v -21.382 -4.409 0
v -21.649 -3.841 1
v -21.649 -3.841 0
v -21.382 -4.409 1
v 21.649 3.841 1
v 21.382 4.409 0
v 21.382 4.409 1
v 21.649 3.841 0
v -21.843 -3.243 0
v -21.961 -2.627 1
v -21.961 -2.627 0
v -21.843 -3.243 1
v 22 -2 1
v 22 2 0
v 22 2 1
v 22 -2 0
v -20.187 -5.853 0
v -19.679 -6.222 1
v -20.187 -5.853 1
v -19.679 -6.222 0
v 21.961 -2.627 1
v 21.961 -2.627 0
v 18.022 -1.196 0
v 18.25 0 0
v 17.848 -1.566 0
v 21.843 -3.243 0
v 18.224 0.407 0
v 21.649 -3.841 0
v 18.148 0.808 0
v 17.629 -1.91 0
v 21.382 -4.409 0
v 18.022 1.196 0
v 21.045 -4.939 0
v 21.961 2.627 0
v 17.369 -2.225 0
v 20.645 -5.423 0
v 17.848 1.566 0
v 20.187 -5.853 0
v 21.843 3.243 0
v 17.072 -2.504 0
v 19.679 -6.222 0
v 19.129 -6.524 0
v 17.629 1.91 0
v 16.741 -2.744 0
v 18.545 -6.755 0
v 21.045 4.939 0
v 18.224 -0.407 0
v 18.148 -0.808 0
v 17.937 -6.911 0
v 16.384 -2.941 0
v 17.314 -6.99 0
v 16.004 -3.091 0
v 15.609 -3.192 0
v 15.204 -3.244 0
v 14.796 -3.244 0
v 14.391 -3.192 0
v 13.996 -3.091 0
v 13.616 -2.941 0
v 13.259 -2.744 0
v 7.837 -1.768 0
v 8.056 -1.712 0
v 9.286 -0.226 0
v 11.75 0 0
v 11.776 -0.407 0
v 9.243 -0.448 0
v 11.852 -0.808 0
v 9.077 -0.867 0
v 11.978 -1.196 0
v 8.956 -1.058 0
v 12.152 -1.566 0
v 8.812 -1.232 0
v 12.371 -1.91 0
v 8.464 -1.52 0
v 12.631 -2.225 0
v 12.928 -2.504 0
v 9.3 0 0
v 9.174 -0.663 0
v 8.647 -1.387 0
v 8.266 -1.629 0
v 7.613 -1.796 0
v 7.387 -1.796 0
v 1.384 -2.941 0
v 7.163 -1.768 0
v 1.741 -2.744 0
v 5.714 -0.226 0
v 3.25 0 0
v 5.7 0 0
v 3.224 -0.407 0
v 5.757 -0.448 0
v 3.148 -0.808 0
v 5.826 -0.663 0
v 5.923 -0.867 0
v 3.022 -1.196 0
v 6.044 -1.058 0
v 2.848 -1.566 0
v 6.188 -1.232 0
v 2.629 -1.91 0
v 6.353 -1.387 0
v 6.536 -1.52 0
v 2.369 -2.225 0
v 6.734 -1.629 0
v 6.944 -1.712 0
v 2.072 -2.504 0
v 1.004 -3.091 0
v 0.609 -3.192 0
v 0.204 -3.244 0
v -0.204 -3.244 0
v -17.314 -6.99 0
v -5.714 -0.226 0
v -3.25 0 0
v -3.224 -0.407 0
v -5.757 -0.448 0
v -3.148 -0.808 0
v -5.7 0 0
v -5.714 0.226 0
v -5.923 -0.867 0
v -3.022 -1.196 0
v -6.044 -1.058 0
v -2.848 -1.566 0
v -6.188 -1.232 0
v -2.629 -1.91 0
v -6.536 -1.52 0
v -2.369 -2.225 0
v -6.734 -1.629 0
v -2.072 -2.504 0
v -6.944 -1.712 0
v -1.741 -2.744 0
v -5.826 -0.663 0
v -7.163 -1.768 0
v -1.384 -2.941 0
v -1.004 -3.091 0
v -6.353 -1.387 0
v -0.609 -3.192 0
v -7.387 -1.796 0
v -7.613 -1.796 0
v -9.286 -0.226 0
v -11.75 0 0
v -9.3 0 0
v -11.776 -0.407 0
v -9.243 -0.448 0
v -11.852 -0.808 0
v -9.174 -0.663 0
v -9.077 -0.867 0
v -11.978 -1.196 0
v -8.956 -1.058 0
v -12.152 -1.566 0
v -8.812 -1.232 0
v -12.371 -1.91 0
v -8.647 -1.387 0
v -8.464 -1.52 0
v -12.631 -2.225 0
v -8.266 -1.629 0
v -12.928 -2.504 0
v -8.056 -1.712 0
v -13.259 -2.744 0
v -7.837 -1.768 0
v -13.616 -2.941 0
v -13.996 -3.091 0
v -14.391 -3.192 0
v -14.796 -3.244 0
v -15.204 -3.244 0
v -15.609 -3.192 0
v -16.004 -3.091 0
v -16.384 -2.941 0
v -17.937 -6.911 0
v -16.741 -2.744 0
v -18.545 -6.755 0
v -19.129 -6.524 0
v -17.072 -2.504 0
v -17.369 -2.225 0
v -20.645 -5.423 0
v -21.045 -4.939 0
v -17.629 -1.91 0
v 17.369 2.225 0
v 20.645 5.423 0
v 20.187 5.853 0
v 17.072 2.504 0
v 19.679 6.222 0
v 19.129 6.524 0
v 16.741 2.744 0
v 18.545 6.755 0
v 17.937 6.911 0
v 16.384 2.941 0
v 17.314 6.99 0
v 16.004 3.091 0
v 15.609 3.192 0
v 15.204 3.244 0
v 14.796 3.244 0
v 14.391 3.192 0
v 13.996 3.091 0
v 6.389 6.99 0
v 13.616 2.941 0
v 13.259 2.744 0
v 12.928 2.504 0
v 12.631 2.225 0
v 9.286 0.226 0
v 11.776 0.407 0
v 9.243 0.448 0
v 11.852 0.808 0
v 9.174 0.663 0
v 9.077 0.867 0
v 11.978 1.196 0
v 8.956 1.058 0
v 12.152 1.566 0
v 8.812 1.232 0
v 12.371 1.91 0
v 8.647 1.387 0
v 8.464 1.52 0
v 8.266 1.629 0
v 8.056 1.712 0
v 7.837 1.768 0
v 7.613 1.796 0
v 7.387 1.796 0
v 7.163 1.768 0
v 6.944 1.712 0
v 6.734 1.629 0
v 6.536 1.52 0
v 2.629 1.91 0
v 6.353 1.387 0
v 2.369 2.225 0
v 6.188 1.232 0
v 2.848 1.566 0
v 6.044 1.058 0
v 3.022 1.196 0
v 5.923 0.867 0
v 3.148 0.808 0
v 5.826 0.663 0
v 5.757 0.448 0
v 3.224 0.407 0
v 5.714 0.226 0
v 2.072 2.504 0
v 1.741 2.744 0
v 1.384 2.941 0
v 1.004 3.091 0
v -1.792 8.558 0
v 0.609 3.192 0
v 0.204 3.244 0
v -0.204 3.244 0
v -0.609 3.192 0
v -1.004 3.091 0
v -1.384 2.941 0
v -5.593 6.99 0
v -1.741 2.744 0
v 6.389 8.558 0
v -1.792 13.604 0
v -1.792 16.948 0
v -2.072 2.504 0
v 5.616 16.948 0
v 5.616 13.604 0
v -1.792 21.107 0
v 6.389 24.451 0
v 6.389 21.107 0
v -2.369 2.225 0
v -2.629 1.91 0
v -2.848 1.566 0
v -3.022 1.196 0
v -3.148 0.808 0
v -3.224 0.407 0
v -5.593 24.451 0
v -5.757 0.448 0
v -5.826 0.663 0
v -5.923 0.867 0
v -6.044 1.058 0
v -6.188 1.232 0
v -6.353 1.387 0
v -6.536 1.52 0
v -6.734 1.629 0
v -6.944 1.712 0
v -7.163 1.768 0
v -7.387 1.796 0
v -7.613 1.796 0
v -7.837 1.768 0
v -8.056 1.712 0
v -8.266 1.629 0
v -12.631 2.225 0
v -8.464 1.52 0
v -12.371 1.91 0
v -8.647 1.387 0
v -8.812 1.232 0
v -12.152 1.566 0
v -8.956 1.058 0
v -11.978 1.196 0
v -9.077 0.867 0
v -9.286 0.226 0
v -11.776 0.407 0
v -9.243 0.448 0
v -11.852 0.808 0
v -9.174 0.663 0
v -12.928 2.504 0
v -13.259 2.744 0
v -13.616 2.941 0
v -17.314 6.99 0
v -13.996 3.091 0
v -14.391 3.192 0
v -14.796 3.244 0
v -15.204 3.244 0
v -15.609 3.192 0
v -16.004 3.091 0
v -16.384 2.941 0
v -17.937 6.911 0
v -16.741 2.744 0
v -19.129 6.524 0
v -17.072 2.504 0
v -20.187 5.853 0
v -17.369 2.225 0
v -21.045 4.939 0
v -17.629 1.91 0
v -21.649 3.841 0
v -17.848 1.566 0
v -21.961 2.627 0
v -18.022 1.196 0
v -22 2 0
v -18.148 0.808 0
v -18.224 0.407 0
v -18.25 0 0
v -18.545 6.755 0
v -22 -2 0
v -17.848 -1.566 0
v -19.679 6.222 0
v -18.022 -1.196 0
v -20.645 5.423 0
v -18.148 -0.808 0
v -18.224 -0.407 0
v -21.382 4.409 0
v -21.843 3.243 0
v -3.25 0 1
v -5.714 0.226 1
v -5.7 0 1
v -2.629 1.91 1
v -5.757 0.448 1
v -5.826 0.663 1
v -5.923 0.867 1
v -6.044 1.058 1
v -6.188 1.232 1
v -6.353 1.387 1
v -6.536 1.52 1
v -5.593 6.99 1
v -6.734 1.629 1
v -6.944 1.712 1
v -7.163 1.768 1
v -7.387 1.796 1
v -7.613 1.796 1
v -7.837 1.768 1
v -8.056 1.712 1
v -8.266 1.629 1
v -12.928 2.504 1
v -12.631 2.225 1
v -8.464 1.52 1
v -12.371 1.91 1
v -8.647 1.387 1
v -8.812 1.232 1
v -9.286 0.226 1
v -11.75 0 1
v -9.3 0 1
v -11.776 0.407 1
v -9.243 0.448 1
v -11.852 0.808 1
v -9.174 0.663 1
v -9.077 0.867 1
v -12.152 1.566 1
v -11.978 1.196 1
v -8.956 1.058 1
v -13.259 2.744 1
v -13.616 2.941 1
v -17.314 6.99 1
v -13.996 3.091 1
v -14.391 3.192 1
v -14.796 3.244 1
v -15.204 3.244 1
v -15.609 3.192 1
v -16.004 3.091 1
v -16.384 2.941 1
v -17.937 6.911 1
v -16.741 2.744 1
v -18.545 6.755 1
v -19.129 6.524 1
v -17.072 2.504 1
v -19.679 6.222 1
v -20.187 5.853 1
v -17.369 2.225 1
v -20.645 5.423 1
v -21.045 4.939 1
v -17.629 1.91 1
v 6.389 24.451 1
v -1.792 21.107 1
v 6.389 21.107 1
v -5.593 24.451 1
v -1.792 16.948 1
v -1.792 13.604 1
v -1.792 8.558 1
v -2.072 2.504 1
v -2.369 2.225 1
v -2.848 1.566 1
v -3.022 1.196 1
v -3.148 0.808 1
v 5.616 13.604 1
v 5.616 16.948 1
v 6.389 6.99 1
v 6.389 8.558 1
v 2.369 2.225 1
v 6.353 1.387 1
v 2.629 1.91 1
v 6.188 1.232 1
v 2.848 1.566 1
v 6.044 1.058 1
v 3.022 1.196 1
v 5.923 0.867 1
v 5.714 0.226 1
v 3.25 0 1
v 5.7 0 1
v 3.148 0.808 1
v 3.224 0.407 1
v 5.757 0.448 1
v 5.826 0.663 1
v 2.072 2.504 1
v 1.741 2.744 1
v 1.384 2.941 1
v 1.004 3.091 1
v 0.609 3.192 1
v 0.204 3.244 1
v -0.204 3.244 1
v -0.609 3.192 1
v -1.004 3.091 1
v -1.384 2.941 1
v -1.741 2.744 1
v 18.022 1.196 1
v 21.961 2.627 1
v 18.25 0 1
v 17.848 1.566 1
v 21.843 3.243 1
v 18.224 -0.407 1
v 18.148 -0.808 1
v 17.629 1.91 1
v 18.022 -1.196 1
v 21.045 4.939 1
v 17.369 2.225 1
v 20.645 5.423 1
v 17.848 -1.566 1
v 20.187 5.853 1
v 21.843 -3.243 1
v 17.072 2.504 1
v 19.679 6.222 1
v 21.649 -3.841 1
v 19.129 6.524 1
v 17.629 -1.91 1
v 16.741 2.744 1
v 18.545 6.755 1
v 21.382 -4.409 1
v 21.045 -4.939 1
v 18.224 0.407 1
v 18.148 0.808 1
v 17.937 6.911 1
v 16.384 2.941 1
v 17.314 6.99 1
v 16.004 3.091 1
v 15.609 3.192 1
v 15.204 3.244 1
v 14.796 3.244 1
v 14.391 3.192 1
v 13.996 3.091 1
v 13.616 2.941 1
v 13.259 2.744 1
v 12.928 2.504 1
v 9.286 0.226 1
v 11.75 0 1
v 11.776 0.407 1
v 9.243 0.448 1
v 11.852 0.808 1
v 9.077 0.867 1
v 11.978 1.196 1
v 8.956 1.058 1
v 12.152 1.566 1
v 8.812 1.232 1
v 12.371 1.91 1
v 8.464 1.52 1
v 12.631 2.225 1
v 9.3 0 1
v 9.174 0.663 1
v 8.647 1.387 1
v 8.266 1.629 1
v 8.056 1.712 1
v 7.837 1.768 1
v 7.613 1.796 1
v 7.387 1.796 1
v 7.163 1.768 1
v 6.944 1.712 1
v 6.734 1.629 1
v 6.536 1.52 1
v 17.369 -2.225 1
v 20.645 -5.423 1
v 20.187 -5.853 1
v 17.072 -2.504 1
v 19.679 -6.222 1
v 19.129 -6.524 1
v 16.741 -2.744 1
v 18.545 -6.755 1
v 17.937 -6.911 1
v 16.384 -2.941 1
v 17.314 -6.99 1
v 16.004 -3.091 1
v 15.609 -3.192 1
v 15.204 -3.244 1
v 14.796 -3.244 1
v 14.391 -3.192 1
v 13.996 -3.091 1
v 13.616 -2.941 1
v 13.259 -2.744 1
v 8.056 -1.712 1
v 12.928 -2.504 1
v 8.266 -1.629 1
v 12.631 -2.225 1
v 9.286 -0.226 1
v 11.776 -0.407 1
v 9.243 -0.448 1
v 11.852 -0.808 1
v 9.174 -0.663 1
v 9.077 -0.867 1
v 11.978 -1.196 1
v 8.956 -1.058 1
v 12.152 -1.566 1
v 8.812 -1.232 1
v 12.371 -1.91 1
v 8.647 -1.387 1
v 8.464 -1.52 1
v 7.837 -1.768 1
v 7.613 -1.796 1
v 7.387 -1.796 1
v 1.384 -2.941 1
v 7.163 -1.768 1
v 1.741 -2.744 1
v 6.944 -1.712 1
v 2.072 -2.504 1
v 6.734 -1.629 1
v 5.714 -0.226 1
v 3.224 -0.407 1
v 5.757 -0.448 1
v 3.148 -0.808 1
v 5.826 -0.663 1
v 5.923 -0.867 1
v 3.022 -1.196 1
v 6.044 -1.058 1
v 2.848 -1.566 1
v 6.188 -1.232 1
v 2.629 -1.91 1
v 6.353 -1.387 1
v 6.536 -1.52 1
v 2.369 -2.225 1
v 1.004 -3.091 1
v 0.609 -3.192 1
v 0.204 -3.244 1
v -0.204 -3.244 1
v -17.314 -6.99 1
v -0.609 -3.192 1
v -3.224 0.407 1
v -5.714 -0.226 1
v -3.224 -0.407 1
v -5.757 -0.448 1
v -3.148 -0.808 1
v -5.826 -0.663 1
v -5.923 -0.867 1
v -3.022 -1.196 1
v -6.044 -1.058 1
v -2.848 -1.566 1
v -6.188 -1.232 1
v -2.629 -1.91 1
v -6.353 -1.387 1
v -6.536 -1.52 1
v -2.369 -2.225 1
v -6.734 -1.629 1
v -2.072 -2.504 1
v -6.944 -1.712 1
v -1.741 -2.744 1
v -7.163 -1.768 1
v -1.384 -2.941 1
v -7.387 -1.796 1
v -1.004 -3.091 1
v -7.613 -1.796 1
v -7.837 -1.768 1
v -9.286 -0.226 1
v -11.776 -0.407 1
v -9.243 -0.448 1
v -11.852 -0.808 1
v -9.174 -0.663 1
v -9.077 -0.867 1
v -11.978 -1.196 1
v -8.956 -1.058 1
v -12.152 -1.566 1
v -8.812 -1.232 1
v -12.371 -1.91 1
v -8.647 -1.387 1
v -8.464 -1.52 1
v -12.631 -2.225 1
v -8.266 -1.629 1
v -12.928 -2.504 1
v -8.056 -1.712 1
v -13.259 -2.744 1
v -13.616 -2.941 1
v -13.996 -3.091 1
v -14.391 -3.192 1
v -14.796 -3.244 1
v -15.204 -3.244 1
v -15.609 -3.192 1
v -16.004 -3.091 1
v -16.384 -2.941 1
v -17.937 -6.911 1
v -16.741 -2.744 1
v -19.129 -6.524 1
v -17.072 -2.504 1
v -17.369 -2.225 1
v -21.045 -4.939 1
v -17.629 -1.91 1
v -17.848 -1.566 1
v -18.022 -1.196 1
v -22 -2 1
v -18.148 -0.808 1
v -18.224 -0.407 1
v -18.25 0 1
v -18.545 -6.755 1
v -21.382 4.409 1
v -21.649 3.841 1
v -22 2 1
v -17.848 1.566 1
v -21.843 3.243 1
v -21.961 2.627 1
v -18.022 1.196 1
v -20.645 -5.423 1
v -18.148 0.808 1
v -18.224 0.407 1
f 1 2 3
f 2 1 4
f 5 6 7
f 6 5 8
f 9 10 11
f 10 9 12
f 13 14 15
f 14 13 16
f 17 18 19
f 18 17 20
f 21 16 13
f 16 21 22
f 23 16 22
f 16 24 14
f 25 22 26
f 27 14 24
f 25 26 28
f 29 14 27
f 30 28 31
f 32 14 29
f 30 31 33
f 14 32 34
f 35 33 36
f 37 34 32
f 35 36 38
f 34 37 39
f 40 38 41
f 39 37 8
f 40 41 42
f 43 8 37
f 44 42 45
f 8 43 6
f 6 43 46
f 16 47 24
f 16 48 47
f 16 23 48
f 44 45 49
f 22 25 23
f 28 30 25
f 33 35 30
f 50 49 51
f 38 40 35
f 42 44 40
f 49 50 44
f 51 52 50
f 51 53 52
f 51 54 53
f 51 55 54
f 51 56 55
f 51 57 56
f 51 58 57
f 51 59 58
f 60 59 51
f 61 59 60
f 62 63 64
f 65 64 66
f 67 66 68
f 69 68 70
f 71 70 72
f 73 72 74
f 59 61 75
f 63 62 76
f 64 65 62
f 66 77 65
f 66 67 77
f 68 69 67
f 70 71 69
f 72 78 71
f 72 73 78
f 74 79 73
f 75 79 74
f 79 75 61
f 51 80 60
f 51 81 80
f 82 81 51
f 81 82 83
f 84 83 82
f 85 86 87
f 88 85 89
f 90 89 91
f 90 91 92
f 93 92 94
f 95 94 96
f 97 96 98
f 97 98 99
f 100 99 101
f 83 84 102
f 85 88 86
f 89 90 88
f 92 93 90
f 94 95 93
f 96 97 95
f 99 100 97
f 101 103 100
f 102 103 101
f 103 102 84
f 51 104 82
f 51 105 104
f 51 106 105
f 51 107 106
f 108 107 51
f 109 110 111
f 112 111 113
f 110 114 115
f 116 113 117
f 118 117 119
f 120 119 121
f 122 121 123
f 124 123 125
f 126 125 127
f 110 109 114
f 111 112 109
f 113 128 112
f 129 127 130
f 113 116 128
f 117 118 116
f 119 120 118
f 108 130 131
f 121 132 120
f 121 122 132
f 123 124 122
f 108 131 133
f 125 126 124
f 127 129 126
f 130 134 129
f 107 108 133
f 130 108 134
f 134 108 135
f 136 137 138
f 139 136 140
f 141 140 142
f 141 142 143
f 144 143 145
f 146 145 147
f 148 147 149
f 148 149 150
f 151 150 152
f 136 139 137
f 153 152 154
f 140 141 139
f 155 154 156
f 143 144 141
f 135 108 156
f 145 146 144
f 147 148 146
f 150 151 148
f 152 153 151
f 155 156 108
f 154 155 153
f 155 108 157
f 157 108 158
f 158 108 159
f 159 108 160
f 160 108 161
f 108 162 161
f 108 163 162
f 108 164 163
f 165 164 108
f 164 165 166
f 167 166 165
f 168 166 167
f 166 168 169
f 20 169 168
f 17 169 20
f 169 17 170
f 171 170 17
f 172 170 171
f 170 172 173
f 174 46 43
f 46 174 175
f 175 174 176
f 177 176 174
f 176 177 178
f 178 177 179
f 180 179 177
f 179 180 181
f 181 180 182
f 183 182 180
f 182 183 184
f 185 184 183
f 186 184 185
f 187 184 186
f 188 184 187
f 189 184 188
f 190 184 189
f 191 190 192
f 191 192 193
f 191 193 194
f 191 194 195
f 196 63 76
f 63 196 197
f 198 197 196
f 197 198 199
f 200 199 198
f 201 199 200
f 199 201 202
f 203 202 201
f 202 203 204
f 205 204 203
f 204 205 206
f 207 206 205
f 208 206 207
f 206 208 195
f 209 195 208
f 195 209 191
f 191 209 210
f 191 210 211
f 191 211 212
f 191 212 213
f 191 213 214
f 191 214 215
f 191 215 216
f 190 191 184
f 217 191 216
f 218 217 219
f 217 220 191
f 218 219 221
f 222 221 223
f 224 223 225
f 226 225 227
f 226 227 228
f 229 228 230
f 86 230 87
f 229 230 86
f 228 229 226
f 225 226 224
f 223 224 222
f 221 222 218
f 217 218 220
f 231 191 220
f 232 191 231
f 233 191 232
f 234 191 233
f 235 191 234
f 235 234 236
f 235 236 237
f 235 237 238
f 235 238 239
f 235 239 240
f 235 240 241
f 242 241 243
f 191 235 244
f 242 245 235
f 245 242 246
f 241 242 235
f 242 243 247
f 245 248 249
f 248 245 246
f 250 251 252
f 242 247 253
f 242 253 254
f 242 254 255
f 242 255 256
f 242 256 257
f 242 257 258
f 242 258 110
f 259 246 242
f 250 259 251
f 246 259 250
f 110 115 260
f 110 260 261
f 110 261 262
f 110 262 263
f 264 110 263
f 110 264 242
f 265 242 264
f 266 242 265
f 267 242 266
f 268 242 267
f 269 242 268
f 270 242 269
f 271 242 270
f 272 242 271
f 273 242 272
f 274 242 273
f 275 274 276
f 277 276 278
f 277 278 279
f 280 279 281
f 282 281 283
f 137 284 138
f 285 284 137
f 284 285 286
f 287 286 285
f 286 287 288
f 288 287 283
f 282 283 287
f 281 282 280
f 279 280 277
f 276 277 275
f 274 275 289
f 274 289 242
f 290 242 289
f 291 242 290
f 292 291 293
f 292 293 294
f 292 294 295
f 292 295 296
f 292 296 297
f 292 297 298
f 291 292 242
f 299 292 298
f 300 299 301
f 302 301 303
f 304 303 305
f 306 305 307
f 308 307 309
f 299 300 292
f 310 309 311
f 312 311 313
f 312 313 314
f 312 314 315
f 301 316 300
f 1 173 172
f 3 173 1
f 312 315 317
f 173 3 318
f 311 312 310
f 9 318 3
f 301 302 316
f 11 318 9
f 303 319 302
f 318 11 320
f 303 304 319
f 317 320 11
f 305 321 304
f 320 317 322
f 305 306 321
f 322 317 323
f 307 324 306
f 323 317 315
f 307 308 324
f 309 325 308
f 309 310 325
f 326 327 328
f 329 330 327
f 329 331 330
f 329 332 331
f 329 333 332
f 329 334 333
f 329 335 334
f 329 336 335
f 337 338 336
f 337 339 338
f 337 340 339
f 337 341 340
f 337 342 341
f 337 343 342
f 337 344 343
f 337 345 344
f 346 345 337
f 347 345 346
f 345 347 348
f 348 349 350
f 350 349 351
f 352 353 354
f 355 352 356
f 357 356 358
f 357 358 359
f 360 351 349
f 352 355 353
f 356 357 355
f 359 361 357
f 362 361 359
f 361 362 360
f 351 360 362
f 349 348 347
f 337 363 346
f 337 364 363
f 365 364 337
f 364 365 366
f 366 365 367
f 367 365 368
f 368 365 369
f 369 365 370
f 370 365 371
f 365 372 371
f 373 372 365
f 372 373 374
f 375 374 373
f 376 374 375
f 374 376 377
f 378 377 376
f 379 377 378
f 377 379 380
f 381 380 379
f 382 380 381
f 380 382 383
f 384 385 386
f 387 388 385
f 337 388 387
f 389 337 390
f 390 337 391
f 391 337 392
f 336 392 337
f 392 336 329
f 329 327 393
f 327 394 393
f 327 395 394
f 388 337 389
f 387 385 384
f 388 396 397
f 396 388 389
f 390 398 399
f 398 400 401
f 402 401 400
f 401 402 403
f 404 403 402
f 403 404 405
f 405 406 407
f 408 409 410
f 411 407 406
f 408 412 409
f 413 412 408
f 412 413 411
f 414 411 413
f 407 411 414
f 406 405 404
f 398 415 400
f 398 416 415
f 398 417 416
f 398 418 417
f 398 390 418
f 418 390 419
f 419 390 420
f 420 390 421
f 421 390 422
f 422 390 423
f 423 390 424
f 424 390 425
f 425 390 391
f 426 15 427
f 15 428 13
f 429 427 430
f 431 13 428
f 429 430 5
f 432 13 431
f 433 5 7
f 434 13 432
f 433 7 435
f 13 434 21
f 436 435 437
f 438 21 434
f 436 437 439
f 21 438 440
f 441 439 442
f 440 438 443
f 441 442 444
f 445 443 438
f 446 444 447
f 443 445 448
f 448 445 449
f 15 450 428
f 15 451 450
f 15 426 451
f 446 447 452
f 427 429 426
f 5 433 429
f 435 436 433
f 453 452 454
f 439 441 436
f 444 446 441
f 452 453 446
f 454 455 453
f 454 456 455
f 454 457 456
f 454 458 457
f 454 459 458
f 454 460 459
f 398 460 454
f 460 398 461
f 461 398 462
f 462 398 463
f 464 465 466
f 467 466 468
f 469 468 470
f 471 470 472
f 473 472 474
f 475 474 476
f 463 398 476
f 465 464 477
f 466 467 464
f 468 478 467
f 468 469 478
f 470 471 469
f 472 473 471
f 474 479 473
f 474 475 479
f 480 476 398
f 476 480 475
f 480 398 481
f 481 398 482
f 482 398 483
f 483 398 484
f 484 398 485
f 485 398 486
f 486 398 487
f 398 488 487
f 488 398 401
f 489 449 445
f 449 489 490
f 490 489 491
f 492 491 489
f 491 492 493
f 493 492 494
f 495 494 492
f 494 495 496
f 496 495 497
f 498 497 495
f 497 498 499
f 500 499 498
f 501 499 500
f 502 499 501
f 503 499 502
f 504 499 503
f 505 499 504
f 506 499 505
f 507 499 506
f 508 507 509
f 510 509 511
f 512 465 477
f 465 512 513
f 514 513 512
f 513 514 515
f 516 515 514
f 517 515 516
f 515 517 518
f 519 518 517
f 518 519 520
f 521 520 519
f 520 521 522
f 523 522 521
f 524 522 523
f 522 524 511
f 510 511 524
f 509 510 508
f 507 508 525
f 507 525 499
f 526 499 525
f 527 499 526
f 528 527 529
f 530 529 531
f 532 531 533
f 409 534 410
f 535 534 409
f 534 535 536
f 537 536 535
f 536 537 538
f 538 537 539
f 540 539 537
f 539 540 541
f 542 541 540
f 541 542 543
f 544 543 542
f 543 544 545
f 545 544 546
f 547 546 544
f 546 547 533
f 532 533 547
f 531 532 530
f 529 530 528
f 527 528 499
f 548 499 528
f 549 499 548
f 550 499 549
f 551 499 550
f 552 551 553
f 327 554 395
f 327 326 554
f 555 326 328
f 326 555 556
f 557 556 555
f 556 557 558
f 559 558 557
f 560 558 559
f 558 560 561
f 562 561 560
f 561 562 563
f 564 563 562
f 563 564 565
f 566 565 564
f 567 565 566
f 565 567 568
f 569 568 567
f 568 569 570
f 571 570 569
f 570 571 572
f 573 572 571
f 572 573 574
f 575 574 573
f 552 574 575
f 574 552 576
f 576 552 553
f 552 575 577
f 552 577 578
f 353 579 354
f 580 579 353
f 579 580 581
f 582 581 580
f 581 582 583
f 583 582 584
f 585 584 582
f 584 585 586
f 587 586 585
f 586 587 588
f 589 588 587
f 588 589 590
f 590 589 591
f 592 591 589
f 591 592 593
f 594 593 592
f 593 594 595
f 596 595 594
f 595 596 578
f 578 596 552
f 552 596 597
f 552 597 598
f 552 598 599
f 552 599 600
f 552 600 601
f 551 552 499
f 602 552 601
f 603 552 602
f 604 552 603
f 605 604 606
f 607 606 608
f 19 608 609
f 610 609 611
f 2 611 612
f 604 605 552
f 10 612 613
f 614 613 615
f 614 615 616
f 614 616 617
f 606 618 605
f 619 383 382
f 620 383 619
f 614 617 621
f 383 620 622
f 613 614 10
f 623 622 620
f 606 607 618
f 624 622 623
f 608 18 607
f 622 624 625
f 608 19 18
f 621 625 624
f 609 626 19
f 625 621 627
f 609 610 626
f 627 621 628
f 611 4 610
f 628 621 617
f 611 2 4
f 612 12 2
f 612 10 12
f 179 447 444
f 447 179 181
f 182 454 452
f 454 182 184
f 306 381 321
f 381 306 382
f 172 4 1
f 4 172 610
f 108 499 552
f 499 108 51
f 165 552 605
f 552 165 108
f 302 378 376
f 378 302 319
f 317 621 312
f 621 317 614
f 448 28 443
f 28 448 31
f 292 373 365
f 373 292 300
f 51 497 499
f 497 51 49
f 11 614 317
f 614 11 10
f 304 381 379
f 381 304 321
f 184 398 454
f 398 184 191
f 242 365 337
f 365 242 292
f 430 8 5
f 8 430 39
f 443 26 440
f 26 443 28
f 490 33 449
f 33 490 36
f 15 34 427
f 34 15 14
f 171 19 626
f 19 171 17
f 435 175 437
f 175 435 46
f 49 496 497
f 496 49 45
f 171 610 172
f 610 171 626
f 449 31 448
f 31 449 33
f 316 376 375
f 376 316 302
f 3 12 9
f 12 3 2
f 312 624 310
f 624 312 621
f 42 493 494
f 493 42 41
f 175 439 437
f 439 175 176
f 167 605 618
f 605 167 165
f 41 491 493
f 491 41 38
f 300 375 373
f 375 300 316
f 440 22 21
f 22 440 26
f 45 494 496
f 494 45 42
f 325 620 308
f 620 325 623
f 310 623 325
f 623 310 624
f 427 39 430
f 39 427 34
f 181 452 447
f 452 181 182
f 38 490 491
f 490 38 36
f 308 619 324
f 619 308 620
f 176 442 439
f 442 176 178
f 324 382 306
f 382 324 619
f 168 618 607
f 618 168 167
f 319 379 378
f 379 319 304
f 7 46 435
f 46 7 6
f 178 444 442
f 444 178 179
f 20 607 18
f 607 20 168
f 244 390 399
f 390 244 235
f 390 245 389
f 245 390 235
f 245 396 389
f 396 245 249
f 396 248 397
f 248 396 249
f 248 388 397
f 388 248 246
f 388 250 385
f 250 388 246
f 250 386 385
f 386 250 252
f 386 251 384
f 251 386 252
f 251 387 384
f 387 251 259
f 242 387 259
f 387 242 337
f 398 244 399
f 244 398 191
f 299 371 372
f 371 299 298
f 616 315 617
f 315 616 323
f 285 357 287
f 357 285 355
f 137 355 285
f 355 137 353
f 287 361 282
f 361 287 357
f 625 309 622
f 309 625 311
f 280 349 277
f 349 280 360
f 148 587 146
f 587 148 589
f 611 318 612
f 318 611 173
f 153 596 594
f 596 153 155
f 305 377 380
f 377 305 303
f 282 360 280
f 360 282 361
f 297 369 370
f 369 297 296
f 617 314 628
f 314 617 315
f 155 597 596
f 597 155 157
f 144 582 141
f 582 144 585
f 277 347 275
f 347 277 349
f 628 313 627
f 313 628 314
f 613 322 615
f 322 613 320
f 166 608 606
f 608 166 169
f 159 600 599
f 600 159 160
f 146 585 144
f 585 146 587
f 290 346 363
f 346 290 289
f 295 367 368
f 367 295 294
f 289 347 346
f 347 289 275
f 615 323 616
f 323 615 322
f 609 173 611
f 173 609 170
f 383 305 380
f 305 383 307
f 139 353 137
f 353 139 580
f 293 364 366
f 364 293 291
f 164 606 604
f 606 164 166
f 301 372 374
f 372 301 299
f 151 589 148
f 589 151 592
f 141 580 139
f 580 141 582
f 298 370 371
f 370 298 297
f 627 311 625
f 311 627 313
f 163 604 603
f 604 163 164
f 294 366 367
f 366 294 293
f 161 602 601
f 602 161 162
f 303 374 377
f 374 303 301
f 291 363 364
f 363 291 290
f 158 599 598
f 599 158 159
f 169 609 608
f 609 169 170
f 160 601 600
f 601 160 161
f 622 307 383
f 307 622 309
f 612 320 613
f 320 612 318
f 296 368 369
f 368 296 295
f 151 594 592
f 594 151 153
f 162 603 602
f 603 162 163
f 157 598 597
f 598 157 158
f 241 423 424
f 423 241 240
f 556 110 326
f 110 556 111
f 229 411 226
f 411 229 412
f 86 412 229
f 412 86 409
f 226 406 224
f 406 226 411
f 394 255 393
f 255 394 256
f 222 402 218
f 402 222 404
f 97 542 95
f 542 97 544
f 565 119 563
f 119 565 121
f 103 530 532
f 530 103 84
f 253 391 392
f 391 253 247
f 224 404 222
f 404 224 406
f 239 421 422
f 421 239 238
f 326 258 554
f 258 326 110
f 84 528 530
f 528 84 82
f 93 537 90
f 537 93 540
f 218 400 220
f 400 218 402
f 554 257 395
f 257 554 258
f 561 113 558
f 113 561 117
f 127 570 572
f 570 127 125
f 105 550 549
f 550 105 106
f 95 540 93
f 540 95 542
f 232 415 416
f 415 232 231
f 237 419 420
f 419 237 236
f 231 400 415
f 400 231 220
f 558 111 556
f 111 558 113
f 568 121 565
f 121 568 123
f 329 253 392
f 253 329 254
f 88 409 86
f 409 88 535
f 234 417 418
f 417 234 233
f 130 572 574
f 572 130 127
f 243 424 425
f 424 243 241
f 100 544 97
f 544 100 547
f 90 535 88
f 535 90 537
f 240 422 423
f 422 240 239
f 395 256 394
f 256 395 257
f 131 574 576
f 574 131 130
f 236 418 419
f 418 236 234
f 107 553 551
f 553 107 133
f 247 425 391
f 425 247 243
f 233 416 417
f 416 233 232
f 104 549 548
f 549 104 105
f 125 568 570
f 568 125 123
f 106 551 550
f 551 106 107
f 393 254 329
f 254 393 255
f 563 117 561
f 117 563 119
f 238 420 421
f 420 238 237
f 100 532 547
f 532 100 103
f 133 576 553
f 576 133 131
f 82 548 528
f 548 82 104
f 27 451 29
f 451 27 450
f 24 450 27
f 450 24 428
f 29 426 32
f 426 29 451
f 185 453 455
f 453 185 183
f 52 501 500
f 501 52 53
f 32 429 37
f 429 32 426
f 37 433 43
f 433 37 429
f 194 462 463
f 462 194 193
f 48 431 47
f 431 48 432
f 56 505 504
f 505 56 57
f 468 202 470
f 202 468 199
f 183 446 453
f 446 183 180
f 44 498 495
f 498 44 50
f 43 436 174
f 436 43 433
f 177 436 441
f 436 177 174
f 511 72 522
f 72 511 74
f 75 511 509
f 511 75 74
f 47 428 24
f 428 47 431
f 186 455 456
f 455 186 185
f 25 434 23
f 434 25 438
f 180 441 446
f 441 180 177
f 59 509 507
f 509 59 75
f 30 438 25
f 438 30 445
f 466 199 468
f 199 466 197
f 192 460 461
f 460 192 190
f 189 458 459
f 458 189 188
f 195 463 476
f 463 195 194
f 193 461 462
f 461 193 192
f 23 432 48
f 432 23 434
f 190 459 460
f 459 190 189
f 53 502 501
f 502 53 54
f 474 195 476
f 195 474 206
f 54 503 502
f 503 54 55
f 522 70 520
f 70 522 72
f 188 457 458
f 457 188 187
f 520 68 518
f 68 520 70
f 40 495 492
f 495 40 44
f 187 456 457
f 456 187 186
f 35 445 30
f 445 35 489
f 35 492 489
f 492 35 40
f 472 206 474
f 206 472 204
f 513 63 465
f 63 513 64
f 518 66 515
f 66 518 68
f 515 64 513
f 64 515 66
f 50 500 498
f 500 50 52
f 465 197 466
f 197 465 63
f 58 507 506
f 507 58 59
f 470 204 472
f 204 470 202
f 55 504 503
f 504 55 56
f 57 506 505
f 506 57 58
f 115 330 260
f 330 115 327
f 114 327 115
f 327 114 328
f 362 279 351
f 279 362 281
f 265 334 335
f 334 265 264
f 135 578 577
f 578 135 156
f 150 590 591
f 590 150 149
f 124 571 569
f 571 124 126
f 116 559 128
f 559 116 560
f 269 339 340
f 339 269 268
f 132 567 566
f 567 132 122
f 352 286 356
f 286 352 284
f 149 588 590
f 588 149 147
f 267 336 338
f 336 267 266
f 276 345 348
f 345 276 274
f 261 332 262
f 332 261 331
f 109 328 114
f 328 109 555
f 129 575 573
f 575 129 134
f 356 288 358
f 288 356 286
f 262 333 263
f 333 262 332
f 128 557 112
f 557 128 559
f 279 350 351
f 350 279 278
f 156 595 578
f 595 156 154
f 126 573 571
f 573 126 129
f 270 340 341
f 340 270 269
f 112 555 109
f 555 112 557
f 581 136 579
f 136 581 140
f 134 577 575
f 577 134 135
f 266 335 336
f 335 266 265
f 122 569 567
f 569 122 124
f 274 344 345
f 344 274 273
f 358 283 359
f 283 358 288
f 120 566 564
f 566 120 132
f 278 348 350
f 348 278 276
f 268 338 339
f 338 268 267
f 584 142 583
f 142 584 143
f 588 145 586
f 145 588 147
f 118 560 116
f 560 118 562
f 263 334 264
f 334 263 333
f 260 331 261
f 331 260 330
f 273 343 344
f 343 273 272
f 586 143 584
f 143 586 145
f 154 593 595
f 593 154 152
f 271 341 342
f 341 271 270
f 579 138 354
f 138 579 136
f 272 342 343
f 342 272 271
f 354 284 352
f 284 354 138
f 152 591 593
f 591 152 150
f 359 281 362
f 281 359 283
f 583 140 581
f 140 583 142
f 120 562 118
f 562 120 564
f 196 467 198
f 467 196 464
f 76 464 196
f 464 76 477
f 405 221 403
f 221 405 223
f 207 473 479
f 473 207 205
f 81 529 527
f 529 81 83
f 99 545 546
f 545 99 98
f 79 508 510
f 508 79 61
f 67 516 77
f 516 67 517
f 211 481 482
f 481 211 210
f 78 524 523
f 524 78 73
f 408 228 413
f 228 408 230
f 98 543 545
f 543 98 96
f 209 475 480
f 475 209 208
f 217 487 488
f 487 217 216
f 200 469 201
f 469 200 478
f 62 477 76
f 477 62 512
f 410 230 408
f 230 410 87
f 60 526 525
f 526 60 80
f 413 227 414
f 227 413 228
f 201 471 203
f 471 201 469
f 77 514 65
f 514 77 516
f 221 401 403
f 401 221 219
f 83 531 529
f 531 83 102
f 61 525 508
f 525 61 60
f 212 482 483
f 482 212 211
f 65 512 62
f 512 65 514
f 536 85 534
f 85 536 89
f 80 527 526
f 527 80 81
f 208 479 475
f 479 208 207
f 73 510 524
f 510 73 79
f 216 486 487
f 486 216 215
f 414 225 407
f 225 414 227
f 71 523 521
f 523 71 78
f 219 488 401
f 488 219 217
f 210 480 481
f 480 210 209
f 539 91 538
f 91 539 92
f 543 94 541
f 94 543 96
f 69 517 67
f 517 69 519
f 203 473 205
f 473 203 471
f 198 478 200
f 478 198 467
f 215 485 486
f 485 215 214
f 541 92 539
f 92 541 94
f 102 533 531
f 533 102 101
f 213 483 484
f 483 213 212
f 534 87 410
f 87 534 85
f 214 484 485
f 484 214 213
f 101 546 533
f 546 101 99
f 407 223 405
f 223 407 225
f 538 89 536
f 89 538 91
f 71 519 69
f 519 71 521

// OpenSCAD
$fn = 50;


difference() {
	union() {
		hull() {
			translate(v = [-17.0000000000, 2.0000000000, 0]) {
				cylinder(h = 1, r = 5);
			}
			translate(v = [17.0000000000, 2.0000000000, 0]) {
				cylinder(h = 1, r = 5);
			}
			translate(v = [-17.0000000000, -2.0000000000, 0]) {
				cylinder(h = 1, r = 5);
			}
			translate(v = [17.0000000000, -2.0000000000, 0]) {
				cylinder(h = 1, r = 5);
			}
		}
		translate(v = [0, 24, 0]) {
			linear_extrude(height = 1) {
				text(font = "DejaVu Sans Mono:style=Bold", halign = "center", size = 19.0000000000, text = "E", valign = "top");
			}
		}
	}
	union() {
		translate(v = [-15.0000000000, 0.0000000000, 0]) {
			translate(v = [0, 0, -100]) {
				cylinder(h = 200, r = 3.2500000000);
			}
		}
		translate(v = [0, 0, -100]) {
			cylinder(h = 200, r = 3.2500000000);
		}
		translate(v = [15.0000000000, 0.0000000000, 0]) {
			translate(v = [0, 0, -100]) {
				cylinder(h = 200, r = 3.2500000000);
			}
		}
		translate(v = [-15.0000000000, 0.0000000000, 0]) {
			translate(v = [0, 0, -100]) {
				cylinder(h = 200, r = 1.8000000000);
			}
		}
		translate(v = [-7.5000000000, 0.0000000000, 0]) {
			translate(v = [0, 0, -100]) {
				cylinder(h = 200, r = 1.8000000000);
			}
		}
		translate(v = [0, 0, -100]) {
			cylinder(h = 200, r = 1.8000000000);
		}
		translate(v = [7.5000000000, 0.0000000000, 0]) {
			translate(v = [0, 0, -100]) {
				cylinder(h = 200, r = 1.8000000000);
			}
		}
		translate(v = [15.0000000000, 0.0000000000, 0]) {
			translate(v = [0, 0, -100]) {
				cylinder(h = 200, r = 1.8000000000);
			}
		}
	}
}
